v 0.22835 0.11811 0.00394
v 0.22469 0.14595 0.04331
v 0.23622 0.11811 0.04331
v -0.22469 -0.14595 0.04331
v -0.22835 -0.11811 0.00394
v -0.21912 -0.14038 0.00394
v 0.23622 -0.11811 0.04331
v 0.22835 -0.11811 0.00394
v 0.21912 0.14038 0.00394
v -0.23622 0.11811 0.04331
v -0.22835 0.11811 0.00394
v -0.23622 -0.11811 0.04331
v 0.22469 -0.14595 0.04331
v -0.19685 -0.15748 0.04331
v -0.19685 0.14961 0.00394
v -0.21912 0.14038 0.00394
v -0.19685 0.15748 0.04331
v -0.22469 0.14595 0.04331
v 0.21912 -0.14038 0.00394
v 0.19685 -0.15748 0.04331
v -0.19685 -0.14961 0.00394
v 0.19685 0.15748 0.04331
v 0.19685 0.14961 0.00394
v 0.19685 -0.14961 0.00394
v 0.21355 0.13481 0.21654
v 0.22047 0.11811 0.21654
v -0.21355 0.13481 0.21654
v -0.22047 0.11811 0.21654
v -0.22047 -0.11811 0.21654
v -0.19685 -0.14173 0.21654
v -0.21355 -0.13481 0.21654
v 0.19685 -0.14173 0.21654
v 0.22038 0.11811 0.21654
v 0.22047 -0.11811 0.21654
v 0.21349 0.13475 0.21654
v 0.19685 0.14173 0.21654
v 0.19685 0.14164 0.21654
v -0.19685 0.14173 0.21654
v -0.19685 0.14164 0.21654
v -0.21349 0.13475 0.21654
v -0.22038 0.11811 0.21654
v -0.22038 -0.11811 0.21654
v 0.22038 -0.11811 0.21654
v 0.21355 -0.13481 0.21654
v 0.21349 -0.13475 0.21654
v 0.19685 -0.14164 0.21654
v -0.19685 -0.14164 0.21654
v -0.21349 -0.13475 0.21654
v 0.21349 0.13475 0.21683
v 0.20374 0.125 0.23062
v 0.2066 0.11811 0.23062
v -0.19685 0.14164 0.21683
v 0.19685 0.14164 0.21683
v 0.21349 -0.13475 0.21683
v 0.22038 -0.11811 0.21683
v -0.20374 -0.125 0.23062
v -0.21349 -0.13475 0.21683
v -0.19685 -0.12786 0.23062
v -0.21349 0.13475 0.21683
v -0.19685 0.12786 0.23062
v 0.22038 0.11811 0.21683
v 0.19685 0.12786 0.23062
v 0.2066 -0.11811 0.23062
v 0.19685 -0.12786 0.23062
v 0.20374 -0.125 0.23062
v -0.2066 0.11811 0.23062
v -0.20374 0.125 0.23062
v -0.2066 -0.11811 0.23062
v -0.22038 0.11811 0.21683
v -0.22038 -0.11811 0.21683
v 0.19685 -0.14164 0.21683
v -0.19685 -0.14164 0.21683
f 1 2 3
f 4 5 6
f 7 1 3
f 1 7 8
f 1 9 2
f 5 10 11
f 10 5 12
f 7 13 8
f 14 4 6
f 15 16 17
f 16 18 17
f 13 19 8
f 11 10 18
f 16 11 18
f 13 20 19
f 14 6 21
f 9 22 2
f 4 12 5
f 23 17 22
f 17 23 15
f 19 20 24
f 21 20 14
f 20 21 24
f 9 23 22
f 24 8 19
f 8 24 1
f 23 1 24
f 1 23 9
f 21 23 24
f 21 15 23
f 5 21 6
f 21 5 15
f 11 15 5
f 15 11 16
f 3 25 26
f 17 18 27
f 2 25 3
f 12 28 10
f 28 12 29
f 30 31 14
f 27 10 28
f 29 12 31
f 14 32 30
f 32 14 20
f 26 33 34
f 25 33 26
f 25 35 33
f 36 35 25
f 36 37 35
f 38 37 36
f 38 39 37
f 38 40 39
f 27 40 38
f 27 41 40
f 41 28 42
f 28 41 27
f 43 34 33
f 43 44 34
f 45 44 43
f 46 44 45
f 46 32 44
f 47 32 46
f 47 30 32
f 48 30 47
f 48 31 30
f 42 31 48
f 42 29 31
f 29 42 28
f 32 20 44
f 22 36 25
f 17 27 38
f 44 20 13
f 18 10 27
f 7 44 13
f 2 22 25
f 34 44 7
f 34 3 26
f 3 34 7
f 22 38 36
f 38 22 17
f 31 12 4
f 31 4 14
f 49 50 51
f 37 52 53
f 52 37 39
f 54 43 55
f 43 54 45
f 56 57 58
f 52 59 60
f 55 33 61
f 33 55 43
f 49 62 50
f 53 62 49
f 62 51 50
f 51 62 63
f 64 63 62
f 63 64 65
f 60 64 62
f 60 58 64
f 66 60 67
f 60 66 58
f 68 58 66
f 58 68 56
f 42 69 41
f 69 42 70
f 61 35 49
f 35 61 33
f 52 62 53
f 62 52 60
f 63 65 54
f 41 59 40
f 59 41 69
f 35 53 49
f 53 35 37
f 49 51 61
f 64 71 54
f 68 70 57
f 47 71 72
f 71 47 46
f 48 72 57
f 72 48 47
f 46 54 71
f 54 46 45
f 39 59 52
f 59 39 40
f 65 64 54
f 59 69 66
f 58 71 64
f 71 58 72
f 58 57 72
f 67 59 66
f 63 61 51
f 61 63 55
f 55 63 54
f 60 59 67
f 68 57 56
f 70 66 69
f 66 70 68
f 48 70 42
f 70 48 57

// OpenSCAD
// file: defines.scad
L = 3.0;  // Длина
W = 3.0;  // Ширина
H = 1.0;  // Высота
Hf = 0.04;  // Возвышение над платой (высота выводов)
e = 0.5;    // Шаг выводов

pin_fragments = 16;

A = 0.60;
E = 1.60;
E1 = 1.20;
D = 0.80;
b = 0.28; // 0.25 .. 0.35
c = 0.10; // 0.07 .. 0.20
L = 0.20;
L1 = 0.1; // 0.05 .. 0.20


scale = 1/2.54;
// main file
include <defines.scad>

fn1 = 8;
fn2 = 8;


R = 0.1;
R1 = 0.08;
R2 = 0.06;

o2 = -0.014;
k2 = 0.0047;

scale(scale)
color([0.25,0.25,0.25])
translate([0, 0, 0.01])
union() {

  /*translate([-E1 / 2, -D / 2, 0]) cube([E1, D, A]);*/

  hull(){
    translate([E1/2 - R, D/2 - R, 0]) cylinder(r1=R1, r2=R, h=c, center=false, $fn=fn1);
    translate([-E1/2 + R, D/2 - R, 0]) cylinder(r1=R1, r2=R, h=c, center=false, $fn=fn1);
    translate([E1/2 - R, -D/2 + R, 0]) cylinder(r1=R1, r2=R, h=c, center=false, $fn=fn1);
    translate([-E1/2 + R, -D/2 + R, 0]) cylinder(r1=R1, r2=R, h=c, center=false, $fn=fn1);
  }

  hull(){
    translate([E1/2 - R, D/2 - R, c]) cylinder(r1=R, r2=R2, h=A-c-R2, center=false, $fn=fn1);
    translate([-E1/2 + R, D/2 - R, c]) cylinder(r1=R, r2=R2, h=A-c-R2, center=false, $fn=fn1);
    translate([E1/2 - R, -D/2 + R, c]) cylinder(r1=R, r2=R2, h=A-c-R2, center=false, $fn=fn1);
    translate([-E1/2 + R, -D/2 + R, c]) cylinder(r1=R, r2=R2, h=A-c-R2, center=false, $fn=fn1);
  }

  translate([0,0,-0.01 + o2])
  hull(){
    translate([E1/2 - R, D/2 - R , A - R2]) sphere(r=R2+k2, $fn=fn2);
    translate([-E1/2 + R, D/2 - R , A - R2]) sphere(r=R2+k2, $fn=fn2);
    translate([E1/2 - R, -D/2 + R , A-R2]) sphere(r=R2+k2, $fn=fn2);
    translate([-E1/2 + R, -D/2 + R , A-R2]) sphere(r=R2+k2, $fn=fn2);
  }

}
